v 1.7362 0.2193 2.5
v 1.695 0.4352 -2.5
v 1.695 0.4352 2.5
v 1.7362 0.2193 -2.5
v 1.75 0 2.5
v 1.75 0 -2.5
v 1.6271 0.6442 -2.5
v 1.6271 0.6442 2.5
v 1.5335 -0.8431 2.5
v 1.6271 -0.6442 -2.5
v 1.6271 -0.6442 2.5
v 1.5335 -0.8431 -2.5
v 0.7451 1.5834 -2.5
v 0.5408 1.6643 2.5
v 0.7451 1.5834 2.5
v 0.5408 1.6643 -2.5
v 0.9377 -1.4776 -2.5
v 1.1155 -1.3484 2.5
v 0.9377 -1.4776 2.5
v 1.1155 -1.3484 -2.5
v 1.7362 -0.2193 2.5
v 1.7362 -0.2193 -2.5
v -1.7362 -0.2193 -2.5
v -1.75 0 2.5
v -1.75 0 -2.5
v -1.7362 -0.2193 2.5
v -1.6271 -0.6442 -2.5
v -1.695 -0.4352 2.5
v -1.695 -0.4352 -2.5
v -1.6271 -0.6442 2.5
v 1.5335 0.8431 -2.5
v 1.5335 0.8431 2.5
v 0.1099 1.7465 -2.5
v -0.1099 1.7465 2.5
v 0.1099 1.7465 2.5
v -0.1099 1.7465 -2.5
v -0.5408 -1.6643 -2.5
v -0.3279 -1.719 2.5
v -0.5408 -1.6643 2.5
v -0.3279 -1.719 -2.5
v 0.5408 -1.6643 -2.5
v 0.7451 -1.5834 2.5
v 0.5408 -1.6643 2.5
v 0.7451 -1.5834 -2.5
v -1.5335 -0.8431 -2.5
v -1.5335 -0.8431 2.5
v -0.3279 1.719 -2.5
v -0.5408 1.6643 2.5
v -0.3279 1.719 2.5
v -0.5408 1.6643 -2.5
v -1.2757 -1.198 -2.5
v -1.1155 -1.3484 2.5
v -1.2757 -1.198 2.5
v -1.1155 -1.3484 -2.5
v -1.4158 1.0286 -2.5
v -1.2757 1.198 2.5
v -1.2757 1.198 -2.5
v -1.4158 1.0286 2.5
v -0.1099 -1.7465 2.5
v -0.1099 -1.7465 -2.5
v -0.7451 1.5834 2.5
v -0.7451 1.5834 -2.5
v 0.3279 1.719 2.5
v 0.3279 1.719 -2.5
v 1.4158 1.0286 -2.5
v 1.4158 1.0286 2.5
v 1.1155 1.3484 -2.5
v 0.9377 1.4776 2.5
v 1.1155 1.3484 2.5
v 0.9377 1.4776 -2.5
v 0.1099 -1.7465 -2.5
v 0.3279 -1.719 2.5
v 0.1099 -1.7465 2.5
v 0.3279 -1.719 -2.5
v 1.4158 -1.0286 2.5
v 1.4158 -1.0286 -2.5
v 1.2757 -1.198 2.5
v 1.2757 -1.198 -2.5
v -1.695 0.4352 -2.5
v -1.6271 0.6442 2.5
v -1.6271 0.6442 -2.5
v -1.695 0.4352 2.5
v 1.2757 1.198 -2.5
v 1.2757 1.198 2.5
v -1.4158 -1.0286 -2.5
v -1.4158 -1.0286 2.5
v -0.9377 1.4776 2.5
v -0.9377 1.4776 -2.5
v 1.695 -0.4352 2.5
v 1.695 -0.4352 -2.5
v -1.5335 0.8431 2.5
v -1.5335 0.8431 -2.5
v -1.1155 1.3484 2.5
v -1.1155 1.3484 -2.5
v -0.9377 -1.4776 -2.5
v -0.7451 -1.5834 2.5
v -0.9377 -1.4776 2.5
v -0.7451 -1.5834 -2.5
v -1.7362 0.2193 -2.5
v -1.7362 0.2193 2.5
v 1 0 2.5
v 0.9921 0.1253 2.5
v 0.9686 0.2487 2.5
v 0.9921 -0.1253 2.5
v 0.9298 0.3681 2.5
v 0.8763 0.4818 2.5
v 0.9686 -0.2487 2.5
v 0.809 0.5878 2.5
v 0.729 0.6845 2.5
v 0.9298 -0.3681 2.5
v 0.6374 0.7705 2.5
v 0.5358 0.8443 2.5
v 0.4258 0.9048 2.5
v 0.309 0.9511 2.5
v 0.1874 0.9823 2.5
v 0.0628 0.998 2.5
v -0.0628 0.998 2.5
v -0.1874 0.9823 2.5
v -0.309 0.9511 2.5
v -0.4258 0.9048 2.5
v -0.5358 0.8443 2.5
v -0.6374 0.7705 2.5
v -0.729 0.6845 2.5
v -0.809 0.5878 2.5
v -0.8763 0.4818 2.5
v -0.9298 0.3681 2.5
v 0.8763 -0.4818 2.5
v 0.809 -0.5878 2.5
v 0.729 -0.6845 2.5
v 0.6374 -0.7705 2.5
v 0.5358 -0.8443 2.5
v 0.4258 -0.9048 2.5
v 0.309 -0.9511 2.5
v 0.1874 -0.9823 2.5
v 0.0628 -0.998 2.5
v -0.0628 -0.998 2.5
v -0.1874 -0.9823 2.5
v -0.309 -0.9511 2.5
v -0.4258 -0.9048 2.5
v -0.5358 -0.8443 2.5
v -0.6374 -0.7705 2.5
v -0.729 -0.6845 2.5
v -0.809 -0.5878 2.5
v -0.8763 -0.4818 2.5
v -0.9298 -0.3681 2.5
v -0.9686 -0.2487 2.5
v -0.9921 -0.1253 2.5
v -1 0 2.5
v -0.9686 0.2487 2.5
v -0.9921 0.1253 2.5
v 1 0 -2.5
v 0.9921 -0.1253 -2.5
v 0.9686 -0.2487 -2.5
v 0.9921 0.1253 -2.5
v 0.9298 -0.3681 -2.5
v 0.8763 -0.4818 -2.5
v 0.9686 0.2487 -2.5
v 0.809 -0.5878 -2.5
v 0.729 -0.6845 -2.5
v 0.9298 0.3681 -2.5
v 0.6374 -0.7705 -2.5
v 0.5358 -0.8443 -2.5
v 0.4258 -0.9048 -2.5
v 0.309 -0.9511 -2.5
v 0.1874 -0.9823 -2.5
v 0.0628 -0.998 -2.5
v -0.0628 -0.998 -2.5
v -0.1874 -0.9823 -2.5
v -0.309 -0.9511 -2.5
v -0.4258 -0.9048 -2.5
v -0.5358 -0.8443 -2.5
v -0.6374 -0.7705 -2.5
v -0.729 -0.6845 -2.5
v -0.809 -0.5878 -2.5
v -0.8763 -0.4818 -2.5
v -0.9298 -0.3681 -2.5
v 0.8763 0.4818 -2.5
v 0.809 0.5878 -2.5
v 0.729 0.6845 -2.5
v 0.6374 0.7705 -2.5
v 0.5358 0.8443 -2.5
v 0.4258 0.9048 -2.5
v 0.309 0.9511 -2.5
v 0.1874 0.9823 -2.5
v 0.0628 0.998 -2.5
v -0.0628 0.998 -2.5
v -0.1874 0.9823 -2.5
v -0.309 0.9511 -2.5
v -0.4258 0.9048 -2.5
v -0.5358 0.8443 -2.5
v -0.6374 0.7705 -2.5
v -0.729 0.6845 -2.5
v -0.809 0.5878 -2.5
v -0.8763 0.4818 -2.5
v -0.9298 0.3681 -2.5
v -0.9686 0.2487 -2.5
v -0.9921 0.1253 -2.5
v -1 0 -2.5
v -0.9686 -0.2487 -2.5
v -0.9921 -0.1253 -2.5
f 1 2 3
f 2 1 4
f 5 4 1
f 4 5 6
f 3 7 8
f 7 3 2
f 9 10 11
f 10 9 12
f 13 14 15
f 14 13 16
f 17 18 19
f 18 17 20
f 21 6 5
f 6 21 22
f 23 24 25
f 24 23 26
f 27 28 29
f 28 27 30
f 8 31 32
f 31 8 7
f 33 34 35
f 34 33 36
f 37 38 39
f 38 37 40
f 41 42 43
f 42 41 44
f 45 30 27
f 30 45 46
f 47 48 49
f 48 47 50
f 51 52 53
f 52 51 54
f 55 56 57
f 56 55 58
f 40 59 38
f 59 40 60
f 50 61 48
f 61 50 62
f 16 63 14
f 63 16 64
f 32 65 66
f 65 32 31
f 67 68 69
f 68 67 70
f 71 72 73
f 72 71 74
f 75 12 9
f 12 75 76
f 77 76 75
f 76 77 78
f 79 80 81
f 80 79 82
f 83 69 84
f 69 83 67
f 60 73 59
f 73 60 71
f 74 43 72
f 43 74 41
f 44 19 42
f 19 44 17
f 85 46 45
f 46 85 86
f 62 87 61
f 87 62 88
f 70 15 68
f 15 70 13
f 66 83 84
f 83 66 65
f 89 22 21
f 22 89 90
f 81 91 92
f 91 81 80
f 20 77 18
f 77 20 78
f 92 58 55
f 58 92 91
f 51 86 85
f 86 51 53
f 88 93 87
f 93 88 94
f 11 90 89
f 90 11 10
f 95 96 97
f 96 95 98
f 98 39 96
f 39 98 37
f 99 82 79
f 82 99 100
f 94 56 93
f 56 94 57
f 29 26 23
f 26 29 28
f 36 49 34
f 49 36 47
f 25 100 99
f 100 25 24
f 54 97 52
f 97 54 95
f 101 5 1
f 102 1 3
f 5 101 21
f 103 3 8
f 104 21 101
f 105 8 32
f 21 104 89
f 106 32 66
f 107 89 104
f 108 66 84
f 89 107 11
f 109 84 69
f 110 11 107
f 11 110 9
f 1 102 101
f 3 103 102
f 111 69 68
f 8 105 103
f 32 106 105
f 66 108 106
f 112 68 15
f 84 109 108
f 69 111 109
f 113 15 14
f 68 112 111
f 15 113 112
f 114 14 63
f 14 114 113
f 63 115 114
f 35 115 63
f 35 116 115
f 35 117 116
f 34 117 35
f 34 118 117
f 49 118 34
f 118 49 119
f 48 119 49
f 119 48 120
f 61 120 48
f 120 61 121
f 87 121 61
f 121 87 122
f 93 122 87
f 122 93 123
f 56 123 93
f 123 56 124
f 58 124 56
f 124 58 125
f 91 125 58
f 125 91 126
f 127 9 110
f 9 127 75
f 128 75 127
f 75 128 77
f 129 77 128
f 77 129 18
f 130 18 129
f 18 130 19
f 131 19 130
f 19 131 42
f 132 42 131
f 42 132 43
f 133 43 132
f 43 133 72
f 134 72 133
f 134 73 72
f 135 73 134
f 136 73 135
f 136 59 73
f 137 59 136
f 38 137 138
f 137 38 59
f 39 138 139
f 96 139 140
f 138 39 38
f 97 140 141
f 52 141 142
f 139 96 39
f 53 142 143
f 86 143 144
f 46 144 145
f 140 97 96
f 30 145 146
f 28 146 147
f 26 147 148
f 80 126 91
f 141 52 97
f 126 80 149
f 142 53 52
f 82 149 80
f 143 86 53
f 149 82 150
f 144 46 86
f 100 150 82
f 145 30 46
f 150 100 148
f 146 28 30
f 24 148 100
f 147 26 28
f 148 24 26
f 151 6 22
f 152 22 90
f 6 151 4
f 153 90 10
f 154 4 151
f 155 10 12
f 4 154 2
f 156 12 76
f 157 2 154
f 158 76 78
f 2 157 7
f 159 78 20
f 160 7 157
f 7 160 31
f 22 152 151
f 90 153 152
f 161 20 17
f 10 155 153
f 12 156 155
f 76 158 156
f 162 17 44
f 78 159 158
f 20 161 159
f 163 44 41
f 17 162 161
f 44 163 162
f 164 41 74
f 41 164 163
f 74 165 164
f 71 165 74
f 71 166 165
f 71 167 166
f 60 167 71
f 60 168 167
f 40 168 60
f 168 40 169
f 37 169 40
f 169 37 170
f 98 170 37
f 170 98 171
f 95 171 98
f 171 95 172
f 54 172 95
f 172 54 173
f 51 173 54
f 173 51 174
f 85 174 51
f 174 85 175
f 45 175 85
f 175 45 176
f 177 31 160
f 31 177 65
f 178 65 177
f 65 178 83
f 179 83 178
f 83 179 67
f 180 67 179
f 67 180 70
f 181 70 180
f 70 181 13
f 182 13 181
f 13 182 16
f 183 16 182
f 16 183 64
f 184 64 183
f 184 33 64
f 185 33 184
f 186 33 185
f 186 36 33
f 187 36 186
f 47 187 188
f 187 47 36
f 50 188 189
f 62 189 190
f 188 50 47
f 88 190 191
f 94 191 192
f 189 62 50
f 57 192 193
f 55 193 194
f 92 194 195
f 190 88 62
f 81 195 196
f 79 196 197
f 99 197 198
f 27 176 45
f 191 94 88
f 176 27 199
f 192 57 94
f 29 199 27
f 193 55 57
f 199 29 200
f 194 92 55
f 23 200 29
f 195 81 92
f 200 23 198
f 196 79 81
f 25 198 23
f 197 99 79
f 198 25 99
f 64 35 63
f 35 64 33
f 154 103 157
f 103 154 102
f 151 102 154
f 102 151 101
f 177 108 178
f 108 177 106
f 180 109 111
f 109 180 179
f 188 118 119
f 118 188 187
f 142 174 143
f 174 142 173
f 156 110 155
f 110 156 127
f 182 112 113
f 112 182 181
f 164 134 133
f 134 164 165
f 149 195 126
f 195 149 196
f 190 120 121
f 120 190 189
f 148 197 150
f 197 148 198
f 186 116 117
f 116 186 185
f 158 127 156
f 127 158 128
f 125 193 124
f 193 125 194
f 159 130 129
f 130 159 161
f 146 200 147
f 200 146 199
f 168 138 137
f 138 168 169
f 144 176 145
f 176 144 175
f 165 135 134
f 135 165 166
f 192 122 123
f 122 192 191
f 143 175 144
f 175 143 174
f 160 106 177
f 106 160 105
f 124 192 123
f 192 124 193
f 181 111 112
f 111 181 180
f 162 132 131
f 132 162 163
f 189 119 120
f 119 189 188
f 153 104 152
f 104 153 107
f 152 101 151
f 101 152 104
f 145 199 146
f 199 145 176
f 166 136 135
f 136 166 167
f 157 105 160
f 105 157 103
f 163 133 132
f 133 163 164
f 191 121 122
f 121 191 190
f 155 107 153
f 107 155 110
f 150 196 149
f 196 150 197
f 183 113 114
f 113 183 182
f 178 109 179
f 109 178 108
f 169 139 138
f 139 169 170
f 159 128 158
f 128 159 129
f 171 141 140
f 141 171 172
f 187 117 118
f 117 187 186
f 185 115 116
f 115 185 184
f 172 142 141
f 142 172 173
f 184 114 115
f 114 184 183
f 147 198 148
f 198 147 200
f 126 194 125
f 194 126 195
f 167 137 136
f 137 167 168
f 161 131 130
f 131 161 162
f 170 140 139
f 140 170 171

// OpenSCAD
$fn = 50;


difference() {
	union() {
		translate(v = [0, 0, -2.5000000000]) {
			cylinder(h = 5, r = 1.7500000000);
		}
	}
	union() {
		translate(v = [0, 0, -100.0000000000]) {
			cylinder(h = 200, r = 1.0000000000);
		}
	}
}
